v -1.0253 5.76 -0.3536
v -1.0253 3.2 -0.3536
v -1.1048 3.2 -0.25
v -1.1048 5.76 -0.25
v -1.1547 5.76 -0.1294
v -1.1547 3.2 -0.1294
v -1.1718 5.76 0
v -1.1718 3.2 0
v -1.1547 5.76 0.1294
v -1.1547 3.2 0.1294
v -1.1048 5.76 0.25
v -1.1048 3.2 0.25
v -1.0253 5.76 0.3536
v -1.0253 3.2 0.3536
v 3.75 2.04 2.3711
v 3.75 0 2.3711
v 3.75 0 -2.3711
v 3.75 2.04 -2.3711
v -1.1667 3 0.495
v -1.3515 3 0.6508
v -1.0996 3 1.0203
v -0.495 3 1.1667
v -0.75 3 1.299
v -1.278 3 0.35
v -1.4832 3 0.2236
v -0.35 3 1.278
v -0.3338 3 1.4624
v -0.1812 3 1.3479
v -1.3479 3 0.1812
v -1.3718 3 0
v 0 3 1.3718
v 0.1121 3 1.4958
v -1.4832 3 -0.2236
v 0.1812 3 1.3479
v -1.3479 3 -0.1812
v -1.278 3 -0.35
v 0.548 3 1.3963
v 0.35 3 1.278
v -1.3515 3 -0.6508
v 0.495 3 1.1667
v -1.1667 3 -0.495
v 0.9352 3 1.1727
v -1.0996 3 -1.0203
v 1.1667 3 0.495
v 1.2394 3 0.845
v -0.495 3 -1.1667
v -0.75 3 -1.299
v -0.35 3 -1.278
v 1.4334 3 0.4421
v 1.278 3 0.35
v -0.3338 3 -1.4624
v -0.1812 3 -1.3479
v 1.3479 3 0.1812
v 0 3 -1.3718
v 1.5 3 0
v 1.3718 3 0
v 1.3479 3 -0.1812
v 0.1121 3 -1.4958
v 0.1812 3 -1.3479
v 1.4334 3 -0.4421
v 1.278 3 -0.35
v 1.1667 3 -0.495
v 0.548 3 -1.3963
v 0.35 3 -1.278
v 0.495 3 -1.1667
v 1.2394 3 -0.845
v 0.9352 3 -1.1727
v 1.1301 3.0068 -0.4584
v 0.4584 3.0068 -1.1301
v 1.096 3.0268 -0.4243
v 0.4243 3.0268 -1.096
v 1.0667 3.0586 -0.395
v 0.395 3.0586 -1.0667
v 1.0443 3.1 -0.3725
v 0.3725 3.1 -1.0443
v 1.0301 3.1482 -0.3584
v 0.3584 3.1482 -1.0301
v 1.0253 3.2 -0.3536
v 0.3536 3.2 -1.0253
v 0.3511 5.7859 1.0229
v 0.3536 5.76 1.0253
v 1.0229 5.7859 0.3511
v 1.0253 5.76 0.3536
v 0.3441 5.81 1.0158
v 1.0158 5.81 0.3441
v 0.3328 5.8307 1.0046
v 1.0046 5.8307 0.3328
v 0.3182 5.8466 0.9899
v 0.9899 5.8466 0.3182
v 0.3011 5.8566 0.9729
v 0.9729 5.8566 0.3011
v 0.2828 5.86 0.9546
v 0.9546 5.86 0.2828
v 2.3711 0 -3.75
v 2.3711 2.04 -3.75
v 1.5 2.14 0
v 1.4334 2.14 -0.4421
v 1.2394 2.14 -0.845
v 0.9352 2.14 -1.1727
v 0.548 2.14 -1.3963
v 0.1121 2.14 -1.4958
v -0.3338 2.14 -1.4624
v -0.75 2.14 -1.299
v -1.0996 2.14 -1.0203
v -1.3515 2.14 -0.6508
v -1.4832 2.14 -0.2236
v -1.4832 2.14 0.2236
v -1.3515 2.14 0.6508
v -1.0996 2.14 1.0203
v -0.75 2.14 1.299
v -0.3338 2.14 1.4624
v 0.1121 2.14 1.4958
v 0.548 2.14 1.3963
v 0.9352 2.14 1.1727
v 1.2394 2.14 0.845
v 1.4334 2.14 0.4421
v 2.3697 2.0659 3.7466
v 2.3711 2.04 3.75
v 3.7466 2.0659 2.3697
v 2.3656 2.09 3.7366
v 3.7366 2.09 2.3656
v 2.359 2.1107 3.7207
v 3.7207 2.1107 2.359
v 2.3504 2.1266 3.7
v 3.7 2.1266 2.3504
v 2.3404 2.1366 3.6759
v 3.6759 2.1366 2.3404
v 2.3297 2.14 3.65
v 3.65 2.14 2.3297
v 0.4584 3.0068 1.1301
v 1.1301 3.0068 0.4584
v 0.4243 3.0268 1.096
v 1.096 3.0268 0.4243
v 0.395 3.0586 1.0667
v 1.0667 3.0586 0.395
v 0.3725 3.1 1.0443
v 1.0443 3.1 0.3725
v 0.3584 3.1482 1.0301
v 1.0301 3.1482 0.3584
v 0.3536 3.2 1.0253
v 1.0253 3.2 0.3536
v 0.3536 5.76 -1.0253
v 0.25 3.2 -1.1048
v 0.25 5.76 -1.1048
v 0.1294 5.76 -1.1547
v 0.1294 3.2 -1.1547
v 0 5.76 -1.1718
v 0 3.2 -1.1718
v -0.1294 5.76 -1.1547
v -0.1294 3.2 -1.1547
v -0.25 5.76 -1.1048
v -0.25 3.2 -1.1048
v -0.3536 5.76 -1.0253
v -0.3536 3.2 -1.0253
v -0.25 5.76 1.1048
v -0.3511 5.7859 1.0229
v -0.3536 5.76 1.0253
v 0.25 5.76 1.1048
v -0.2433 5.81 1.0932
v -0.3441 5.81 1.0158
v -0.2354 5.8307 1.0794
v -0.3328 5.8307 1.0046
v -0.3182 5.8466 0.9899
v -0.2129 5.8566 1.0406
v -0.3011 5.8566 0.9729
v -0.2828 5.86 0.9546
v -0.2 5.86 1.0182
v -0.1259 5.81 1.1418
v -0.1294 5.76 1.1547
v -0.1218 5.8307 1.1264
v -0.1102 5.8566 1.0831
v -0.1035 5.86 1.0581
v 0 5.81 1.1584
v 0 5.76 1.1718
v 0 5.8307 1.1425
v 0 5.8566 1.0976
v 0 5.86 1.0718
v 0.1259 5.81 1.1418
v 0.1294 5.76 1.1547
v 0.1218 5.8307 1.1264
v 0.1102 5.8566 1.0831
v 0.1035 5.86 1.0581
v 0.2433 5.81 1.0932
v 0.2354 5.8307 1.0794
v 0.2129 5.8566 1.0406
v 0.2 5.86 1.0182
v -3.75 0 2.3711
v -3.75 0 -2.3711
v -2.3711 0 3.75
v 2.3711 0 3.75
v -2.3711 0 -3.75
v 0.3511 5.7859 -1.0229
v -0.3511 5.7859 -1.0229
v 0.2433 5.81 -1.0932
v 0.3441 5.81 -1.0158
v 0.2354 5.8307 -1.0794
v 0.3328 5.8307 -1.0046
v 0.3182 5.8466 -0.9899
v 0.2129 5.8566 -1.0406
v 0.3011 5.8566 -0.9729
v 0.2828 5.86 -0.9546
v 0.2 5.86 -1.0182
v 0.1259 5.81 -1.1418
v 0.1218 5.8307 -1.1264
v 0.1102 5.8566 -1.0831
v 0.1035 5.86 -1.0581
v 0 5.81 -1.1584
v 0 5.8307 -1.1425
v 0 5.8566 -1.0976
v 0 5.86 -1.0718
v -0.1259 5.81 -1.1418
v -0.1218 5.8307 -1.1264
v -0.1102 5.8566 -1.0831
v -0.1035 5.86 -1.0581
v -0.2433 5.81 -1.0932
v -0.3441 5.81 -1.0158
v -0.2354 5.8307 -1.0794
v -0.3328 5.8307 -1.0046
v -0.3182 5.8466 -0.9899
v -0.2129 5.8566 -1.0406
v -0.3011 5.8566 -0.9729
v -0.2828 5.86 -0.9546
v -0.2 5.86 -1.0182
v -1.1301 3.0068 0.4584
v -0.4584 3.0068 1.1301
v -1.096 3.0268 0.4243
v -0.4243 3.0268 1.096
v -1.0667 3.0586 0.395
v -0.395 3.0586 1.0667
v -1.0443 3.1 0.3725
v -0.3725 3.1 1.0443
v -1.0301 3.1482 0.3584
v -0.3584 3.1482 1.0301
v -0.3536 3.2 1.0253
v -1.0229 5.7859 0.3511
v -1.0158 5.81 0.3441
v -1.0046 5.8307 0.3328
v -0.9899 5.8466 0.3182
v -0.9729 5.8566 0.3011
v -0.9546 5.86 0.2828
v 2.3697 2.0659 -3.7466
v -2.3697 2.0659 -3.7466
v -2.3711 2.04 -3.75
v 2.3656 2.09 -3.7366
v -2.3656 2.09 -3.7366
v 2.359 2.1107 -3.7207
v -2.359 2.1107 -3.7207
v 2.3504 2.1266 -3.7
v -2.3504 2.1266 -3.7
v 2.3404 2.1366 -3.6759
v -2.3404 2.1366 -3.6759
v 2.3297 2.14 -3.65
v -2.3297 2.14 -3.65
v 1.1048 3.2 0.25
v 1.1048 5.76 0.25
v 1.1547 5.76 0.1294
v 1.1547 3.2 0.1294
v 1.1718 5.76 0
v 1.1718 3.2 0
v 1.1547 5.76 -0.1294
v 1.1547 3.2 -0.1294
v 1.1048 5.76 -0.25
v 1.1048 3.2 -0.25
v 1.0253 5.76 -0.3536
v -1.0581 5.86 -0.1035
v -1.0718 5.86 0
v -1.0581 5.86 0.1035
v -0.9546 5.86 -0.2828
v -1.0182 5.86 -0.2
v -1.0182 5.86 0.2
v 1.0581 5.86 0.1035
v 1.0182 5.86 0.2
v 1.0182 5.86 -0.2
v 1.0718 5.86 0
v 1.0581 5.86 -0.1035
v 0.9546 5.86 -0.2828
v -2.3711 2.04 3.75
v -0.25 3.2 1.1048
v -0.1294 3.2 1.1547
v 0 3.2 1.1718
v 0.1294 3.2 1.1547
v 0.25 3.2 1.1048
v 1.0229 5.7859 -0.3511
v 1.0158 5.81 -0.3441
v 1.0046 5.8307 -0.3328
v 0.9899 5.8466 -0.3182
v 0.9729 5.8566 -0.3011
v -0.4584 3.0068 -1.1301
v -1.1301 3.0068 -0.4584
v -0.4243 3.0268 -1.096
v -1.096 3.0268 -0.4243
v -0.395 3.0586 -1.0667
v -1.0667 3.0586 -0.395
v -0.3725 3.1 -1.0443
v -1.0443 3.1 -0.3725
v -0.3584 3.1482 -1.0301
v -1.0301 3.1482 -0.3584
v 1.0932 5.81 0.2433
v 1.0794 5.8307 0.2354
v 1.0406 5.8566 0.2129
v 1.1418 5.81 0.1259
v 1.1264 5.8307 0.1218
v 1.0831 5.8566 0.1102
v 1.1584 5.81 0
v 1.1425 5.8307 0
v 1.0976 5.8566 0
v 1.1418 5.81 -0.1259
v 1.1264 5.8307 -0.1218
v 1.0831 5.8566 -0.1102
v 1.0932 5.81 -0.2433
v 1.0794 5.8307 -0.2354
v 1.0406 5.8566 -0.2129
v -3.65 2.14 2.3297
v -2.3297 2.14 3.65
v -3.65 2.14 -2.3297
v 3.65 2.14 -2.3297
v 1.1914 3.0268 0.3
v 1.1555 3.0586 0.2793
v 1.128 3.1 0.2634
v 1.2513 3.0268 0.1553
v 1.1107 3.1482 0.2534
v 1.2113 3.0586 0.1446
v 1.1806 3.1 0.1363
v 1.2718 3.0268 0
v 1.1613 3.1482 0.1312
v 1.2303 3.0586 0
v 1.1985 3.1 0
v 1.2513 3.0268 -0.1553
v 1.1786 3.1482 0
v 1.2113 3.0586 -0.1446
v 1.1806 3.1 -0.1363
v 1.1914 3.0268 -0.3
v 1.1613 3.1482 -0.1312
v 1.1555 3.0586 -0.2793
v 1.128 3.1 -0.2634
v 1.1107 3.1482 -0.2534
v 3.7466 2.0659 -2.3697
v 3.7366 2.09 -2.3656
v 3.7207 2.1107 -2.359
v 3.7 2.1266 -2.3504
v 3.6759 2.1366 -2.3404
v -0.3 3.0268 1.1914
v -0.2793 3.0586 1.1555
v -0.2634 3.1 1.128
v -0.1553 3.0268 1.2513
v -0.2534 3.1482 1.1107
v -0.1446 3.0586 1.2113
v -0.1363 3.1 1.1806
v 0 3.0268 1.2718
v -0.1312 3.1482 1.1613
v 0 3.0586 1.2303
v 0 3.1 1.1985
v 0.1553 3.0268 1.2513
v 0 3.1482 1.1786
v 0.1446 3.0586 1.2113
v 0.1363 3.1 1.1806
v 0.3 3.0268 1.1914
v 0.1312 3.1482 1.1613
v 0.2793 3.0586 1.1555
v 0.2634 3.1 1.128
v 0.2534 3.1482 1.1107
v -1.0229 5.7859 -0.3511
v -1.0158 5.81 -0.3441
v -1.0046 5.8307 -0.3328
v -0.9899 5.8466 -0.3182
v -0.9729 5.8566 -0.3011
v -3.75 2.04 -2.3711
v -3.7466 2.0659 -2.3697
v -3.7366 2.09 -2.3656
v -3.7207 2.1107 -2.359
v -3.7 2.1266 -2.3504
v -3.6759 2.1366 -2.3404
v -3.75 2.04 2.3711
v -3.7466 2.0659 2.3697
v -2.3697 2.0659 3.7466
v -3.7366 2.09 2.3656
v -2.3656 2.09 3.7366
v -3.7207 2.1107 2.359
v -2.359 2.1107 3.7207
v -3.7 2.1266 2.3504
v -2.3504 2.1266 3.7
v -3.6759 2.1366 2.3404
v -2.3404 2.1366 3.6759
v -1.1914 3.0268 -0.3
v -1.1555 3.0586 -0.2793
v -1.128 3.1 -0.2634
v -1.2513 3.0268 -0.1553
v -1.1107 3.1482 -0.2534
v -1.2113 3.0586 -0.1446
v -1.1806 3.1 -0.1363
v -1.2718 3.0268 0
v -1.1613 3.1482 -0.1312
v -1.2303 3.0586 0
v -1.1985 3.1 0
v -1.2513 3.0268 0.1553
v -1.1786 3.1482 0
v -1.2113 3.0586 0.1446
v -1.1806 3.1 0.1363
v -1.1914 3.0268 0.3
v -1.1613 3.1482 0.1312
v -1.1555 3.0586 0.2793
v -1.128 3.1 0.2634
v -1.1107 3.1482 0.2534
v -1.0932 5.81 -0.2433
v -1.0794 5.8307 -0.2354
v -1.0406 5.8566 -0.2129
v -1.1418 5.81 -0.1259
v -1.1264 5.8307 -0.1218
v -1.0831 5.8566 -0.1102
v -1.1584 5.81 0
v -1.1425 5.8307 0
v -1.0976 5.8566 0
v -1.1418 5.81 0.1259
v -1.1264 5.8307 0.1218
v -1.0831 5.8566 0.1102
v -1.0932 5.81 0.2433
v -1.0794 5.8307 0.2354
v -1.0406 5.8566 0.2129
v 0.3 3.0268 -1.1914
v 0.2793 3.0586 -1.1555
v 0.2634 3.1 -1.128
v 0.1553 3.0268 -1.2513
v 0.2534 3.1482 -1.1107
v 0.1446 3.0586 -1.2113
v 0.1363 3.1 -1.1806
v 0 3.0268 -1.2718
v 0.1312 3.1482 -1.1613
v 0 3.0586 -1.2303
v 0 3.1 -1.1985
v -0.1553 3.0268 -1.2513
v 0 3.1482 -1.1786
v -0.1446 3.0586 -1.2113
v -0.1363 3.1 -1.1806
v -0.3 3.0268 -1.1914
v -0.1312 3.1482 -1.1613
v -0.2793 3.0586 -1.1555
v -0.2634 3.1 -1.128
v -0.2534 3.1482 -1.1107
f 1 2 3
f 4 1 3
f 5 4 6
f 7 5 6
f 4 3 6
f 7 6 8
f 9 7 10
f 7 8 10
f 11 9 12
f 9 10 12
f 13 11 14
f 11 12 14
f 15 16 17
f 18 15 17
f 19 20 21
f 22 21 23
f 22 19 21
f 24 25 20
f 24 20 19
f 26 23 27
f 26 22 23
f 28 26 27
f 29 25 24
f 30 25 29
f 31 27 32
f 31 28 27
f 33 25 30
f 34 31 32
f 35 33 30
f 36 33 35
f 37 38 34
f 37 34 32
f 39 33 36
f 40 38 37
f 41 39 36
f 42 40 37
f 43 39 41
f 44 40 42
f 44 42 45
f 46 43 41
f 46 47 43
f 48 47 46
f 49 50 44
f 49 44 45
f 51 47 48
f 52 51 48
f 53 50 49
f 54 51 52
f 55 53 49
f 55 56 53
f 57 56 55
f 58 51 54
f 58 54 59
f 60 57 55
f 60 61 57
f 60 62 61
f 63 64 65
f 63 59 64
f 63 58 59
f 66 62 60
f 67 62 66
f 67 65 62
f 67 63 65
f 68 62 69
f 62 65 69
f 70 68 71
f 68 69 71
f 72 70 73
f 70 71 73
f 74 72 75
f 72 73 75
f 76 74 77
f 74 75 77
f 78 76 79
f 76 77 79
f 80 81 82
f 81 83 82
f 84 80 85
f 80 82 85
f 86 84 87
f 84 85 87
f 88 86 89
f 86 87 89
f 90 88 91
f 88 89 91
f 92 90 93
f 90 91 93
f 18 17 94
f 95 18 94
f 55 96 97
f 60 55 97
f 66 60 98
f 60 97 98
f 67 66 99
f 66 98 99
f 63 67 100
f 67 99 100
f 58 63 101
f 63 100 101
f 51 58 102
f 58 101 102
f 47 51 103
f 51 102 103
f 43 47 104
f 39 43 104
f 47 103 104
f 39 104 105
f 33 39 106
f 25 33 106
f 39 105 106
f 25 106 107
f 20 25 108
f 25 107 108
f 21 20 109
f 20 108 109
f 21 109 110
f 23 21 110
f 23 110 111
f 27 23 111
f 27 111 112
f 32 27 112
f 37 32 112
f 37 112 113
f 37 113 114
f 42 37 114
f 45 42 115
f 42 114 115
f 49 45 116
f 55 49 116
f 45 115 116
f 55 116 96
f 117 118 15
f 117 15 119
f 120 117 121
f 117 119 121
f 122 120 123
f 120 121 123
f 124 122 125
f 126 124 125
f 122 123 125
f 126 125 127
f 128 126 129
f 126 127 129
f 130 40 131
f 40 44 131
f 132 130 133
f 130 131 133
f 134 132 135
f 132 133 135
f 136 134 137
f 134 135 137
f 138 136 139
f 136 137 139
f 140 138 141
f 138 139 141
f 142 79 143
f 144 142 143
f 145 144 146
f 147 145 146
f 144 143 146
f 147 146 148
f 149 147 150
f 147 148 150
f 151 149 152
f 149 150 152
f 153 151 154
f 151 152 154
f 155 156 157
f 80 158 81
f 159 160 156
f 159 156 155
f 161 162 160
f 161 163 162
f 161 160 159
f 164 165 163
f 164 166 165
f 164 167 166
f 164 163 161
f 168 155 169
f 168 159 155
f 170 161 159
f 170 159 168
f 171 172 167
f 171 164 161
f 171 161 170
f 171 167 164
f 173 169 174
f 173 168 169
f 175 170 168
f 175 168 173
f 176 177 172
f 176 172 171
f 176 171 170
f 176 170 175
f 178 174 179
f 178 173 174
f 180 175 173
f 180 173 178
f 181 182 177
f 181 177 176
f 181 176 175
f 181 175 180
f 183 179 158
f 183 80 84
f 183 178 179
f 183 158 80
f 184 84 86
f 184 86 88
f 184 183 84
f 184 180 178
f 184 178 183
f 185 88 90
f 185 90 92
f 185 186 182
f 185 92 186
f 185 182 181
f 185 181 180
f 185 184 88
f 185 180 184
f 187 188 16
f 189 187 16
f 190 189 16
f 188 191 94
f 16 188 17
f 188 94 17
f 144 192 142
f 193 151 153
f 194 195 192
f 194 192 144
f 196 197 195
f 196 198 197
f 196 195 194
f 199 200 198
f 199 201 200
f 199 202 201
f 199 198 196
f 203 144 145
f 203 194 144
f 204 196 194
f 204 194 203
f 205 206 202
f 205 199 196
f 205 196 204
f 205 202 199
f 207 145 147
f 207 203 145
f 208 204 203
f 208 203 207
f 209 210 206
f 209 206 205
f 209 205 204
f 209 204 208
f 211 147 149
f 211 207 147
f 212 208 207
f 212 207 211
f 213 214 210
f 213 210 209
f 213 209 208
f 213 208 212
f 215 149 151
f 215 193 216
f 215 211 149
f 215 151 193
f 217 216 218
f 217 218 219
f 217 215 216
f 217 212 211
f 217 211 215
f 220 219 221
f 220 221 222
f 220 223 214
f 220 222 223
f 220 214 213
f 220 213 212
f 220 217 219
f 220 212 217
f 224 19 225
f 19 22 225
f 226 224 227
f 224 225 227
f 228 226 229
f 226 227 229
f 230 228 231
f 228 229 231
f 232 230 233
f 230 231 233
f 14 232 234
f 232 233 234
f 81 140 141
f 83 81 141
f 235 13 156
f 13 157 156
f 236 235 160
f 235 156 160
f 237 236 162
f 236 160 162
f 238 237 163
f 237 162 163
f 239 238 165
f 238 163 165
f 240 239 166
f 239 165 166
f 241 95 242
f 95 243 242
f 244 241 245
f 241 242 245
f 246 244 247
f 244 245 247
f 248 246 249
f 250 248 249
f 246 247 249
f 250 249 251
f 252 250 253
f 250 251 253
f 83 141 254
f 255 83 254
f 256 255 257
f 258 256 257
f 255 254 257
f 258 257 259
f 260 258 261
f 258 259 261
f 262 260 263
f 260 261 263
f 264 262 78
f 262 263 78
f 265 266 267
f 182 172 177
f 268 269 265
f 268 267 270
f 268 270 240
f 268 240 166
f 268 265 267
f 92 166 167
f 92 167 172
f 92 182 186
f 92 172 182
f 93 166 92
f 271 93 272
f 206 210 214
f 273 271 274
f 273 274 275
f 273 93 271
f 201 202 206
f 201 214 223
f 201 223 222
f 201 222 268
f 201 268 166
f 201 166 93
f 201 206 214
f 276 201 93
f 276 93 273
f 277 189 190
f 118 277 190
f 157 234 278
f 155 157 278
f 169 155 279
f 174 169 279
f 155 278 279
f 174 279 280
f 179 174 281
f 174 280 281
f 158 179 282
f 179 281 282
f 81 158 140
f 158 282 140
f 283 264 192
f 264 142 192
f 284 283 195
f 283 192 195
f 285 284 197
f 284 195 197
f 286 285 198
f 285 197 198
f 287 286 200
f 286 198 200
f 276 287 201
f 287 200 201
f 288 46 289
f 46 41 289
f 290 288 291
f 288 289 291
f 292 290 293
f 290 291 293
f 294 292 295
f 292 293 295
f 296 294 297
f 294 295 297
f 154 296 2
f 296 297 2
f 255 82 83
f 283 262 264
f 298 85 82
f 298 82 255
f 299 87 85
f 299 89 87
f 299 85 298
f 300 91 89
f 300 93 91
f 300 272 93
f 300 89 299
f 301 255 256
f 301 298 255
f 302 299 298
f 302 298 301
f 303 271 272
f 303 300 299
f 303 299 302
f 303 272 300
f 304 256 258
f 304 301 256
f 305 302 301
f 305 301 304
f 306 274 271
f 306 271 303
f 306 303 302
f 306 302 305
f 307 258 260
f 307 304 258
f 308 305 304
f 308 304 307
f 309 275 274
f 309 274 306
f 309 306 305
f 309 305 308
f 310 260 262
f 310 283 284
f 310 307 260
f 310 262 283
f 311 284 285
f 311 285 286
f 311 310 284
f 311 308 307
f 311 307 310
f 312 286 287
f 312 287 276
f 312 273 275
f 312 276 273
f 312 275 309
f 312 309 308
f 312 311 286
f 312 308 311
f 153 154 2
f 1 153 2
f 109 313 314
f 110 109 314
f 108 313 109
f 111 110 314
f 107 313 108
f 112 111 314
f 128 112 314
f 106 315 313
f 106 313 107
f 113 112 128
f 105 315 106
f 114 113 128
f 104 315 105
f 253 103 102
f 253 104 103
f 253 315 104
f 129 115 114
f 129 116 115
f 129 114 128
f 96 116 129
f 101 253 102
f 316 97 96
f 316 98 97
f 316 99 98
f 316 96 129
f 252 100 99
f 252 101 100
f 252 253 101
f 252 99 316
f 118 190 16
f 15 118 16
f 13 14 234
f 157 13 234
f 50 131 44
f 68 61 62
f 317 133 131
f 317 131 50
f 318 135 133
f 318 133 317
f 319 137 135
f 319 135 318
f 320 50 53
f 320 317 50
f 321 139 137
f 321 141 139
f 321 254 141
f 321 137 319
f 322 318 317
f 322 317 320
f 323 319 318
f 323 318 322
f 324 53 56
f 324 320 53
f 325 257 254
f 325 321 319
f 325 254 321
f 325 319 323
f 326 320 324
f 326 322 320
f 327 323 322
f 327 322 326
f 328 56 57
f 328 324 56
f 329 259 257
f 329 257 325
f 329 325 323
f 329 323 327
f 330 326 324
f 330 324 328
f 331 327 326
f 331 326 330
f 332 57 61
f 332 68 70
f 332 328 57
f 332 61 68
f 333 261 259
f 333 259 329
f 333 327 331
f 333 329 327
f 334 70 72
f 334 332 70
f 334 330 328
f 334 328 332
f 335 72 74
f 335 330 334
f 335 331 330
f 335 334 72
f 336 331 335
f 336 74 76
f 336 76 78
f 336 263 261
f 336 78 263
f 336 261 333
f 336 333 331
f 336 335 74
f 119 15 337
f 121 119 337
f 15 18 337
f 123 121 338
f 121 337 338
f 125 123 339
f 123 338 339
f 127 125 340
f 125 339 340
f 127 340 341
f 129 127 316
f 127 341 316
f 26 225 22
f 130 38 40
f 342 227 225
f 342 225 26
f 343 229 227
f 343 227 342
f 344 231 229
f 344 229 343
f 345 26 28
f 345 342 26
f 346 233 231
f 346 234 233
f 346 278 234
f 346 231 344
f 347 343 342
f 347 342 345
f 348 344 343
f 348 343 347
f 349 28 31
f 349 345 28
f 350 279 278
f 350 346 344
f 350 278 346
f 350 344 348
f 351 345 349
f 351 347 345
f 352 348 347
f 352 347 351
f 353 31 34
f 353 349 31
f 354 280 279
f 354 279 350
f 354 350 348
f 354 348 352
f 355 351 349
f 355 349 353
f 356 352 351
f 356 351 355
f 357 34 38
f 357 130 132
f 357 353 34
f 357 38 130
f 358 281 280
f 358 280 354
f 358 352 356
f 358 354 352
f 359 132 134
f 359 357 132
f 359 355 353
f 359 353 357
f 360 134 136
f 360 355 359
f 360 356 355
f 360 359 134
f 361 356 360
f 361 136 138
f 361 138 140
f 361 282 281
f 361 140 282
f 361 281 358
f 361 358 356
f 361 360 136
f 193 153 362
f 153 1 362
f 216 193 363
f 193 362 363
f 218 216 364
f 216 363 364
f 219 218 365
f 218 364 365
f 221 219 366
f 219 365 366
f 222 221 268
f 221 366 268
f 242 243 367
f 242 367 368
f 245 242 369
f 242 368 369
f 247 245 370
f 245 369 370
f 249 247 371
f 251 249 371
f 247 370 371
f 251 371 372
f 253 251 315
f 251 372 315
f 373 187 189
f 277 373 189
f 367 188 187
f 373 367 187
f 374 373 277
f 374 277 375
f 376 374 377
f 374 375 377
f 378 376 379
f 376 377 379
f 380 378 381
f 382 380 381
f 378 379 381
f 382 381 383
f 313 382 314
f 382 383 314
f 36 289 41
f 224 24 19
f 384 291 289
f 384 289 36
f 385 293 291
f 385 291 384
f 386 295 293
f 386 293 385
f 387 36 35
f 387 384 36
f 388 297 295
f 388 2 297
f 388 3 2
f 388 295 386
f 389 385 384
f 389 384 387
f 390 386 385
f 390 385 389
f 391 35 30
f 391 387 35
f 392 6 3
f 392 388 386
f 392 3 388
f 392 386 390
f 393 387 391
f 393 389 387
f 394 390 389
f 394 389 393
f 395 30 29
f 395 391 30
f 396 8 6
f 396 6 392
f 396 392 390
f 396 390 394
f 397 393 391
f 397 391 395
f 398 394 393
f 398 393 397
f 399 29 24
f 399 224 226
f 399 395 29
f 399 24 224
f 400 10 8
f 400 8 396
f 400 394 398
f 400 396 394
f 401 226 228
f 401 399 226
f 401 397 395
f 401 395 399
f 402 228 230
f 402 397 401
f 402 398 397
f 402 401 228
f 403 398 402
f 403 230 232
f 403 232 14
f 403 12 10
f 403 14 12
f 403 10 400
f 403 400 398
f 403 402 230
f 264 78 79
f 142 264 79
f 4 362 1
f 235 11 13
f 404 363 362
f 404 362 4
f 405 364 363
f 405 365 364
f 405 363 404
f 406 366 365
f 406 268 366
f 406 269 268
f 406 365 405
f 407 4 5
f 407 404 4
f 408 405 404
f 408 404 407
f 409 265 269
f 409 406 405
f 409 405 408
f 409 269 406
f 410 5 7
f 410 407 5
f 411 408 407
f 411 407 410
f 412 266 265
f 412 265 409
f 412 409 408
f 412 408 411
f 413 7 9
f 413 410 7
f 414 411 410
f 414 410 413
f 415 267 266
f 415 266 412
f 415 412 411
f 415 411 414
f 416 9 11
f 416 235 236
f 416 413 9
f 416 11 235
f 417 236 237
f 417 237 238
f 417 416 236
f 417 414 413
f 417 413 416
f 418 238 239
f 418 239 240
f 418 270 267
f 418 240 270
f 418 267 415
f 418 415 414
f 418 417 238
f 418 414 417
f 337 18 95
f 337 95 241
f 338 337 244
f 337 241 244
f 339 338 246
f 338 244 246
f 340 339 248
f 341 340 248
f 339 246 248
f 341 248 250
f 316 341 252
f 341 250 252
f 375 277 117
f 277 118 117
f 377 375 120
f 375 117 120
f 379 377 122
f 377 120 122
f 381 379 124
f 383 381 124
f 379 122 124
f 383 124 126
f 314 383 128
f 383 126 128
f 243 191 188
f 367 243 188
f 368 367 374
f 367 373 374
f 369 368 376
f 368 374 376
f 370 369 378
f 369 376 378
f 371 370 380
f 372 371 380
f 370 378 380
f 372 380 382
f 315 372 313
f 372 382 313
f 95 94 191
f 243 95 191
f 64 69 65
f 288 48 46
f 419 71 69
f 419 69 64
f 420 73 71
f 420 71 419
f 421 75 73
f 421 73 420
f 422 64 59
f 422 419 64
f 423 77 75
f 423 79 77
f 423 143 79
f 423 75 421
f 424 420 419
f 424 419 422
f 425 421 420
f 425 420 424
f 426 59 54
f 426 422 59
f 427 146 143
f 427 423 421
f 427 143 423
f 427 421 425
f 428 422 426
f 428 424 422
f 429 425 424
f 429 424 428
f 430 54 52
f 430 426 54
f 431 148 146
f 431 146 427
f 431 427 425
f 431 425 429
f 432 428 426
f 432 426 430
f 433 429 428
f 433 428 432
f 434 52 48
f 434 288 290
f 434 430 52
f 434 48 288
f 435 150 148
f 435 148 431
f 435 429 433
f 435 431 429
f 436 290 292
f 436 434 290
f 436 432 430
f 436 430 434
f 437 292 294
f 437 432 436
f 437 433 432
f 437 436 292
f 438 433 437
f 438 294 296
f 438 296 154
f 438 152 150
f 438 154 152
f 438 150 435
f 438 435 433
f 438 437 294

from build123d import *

# Parameters (mm, degrees)
BOSS_EXTRUDE1_DEPTH = 2.14
FILLET1_R           = 0.1
SKETCH2_R           = 1.5
BOSS_EXTRUDE2_DEPTH = 0.86
BOSS_EXTRUDE3_DEPTH = 2.86
FILLET2_R           = 0.1
FILLET3_R           = 0.2


with BuildPart() as part:
    # Sketch1 → Boss-Extrude1 (new body)
    with BuildSketch(Plane(origin=(0, 0, 0), x_dir=(1, 0, 0), z_dir=(0, 1, 0))):
        Polygon((2.371141777, -3.75), (3.75, -2.371141777), (3.75, 2.371141777), (2.371141777, 3.75), (-2.371141777, 3.75), (-3.75, 2.371141777), (-3.75, -2.371141777), (-2.371141777, -3.75), align=None)
    extrude(amount=BOSS_EXTRUDE1_DEPTH)

    # Fillet1
    fillet1_edges = [part.edges().sort_by_distance(p)[0] for p in [
        (3.75, 2.14, 0),
        (3.060570888, 2.14, -3.060570888),
        (0, 2.14, -3.75),
        (-3.060570888, 2.14, -3.060570888),
        (-3.75, 2.14, 0),
        (-3.060570888, 2.14, 3.060570888),
        (0, 2.14, 3.75),
        (3.060570888, 2.14, 3.060570888),
    ]]
    fillet(fillet1_edges, radius=FILLET1_R)

    # Sketch2 → Boss-Extrude2 (add)
    with BuildSketch(Plane(origin=(0, 2.14, 0), x_dir=(1, 0, 0), z_dir=(0, 1, 0))):
        Circle(SKETCH2_R)
    extrude(amount=BOSS_EXTRUDE2_DEPTH)

    # Sketch3 → Boss-Extrude3 (add)
    with BuildSketch(Plane(origin=(0, 3, 0), x_dir=(1, 0, 0), z_dir=(0, 1, 0))):
        with BuildLine():
            Line((-0.353553391, 1.025304833), (-1.025304833, 0.353553391))
            ThreePointArc((-1.025304833, 0.353553391), (-1.171751442, 0), (-1.025304833, -0.353553391))
            Line((-1.025304833, -0.353553391), (-0.353553391, -1.025304833))
            ThreePointArc((-0.353553391, -1.025304833), (0, -1.171751442), (0.353553391, -1.025304833))
            Line((0.353553391, -1.025304833), (1.025304833, -0.353553391))
            ThreePointArc((1.025304833, -0.353553391), (1.171751442, 0), (1.025304833, 0.353553391))
            Line((1.025304833, 0.353553391), (0.353553391, 1.025304833))
            ThreePointArc((0.353553391, 1.025304833), (0, 1.171751442), (-0.353553391, 1.025304833))
        make_face()
    extrude(amount=BOSS_EXTRUDE3_DEPTH)

    # Fillet2
    fillet2_edges = [part.edges().sort_by_distance(p)[0] for p in [
        (-1.171751442, 5.86, 0),
        (-0.689429112, 5.86, 0.689429112),
        (0, 5.86, 1.171751442),
        (0.689429112, 5.86, 0.689429112),
        (1.171751442, 5.86, 0),
        (0.689429112, 5.86, -0.689429112),
        (0, 5.86, -1.171751442),
        (-0.689429112, 5.86, -0.689429112),
    ]]
    fillet(fillet2_edges, radius=FILLET2_R)

    # Fillet3
    fillet3_edges = [part.edges().sort_by_distance(p)[0] for p in [
        (-1.171751442, 3, 0),
        (-0.689429112, 3, 0.689429112),
        (0, 3, 1.171751442),
        (0.689429112, 3, 0.689429112),
        (1.171751442, 3, 0),
        (0.689429112, 3, -0.689429112),
        (0, 3, -1.171751442),
        (-0.689429112, 3, -0.689429112),
    ]]
    fillet(fillet3_edges, radius=FILLET3_R)


solid = part.part
